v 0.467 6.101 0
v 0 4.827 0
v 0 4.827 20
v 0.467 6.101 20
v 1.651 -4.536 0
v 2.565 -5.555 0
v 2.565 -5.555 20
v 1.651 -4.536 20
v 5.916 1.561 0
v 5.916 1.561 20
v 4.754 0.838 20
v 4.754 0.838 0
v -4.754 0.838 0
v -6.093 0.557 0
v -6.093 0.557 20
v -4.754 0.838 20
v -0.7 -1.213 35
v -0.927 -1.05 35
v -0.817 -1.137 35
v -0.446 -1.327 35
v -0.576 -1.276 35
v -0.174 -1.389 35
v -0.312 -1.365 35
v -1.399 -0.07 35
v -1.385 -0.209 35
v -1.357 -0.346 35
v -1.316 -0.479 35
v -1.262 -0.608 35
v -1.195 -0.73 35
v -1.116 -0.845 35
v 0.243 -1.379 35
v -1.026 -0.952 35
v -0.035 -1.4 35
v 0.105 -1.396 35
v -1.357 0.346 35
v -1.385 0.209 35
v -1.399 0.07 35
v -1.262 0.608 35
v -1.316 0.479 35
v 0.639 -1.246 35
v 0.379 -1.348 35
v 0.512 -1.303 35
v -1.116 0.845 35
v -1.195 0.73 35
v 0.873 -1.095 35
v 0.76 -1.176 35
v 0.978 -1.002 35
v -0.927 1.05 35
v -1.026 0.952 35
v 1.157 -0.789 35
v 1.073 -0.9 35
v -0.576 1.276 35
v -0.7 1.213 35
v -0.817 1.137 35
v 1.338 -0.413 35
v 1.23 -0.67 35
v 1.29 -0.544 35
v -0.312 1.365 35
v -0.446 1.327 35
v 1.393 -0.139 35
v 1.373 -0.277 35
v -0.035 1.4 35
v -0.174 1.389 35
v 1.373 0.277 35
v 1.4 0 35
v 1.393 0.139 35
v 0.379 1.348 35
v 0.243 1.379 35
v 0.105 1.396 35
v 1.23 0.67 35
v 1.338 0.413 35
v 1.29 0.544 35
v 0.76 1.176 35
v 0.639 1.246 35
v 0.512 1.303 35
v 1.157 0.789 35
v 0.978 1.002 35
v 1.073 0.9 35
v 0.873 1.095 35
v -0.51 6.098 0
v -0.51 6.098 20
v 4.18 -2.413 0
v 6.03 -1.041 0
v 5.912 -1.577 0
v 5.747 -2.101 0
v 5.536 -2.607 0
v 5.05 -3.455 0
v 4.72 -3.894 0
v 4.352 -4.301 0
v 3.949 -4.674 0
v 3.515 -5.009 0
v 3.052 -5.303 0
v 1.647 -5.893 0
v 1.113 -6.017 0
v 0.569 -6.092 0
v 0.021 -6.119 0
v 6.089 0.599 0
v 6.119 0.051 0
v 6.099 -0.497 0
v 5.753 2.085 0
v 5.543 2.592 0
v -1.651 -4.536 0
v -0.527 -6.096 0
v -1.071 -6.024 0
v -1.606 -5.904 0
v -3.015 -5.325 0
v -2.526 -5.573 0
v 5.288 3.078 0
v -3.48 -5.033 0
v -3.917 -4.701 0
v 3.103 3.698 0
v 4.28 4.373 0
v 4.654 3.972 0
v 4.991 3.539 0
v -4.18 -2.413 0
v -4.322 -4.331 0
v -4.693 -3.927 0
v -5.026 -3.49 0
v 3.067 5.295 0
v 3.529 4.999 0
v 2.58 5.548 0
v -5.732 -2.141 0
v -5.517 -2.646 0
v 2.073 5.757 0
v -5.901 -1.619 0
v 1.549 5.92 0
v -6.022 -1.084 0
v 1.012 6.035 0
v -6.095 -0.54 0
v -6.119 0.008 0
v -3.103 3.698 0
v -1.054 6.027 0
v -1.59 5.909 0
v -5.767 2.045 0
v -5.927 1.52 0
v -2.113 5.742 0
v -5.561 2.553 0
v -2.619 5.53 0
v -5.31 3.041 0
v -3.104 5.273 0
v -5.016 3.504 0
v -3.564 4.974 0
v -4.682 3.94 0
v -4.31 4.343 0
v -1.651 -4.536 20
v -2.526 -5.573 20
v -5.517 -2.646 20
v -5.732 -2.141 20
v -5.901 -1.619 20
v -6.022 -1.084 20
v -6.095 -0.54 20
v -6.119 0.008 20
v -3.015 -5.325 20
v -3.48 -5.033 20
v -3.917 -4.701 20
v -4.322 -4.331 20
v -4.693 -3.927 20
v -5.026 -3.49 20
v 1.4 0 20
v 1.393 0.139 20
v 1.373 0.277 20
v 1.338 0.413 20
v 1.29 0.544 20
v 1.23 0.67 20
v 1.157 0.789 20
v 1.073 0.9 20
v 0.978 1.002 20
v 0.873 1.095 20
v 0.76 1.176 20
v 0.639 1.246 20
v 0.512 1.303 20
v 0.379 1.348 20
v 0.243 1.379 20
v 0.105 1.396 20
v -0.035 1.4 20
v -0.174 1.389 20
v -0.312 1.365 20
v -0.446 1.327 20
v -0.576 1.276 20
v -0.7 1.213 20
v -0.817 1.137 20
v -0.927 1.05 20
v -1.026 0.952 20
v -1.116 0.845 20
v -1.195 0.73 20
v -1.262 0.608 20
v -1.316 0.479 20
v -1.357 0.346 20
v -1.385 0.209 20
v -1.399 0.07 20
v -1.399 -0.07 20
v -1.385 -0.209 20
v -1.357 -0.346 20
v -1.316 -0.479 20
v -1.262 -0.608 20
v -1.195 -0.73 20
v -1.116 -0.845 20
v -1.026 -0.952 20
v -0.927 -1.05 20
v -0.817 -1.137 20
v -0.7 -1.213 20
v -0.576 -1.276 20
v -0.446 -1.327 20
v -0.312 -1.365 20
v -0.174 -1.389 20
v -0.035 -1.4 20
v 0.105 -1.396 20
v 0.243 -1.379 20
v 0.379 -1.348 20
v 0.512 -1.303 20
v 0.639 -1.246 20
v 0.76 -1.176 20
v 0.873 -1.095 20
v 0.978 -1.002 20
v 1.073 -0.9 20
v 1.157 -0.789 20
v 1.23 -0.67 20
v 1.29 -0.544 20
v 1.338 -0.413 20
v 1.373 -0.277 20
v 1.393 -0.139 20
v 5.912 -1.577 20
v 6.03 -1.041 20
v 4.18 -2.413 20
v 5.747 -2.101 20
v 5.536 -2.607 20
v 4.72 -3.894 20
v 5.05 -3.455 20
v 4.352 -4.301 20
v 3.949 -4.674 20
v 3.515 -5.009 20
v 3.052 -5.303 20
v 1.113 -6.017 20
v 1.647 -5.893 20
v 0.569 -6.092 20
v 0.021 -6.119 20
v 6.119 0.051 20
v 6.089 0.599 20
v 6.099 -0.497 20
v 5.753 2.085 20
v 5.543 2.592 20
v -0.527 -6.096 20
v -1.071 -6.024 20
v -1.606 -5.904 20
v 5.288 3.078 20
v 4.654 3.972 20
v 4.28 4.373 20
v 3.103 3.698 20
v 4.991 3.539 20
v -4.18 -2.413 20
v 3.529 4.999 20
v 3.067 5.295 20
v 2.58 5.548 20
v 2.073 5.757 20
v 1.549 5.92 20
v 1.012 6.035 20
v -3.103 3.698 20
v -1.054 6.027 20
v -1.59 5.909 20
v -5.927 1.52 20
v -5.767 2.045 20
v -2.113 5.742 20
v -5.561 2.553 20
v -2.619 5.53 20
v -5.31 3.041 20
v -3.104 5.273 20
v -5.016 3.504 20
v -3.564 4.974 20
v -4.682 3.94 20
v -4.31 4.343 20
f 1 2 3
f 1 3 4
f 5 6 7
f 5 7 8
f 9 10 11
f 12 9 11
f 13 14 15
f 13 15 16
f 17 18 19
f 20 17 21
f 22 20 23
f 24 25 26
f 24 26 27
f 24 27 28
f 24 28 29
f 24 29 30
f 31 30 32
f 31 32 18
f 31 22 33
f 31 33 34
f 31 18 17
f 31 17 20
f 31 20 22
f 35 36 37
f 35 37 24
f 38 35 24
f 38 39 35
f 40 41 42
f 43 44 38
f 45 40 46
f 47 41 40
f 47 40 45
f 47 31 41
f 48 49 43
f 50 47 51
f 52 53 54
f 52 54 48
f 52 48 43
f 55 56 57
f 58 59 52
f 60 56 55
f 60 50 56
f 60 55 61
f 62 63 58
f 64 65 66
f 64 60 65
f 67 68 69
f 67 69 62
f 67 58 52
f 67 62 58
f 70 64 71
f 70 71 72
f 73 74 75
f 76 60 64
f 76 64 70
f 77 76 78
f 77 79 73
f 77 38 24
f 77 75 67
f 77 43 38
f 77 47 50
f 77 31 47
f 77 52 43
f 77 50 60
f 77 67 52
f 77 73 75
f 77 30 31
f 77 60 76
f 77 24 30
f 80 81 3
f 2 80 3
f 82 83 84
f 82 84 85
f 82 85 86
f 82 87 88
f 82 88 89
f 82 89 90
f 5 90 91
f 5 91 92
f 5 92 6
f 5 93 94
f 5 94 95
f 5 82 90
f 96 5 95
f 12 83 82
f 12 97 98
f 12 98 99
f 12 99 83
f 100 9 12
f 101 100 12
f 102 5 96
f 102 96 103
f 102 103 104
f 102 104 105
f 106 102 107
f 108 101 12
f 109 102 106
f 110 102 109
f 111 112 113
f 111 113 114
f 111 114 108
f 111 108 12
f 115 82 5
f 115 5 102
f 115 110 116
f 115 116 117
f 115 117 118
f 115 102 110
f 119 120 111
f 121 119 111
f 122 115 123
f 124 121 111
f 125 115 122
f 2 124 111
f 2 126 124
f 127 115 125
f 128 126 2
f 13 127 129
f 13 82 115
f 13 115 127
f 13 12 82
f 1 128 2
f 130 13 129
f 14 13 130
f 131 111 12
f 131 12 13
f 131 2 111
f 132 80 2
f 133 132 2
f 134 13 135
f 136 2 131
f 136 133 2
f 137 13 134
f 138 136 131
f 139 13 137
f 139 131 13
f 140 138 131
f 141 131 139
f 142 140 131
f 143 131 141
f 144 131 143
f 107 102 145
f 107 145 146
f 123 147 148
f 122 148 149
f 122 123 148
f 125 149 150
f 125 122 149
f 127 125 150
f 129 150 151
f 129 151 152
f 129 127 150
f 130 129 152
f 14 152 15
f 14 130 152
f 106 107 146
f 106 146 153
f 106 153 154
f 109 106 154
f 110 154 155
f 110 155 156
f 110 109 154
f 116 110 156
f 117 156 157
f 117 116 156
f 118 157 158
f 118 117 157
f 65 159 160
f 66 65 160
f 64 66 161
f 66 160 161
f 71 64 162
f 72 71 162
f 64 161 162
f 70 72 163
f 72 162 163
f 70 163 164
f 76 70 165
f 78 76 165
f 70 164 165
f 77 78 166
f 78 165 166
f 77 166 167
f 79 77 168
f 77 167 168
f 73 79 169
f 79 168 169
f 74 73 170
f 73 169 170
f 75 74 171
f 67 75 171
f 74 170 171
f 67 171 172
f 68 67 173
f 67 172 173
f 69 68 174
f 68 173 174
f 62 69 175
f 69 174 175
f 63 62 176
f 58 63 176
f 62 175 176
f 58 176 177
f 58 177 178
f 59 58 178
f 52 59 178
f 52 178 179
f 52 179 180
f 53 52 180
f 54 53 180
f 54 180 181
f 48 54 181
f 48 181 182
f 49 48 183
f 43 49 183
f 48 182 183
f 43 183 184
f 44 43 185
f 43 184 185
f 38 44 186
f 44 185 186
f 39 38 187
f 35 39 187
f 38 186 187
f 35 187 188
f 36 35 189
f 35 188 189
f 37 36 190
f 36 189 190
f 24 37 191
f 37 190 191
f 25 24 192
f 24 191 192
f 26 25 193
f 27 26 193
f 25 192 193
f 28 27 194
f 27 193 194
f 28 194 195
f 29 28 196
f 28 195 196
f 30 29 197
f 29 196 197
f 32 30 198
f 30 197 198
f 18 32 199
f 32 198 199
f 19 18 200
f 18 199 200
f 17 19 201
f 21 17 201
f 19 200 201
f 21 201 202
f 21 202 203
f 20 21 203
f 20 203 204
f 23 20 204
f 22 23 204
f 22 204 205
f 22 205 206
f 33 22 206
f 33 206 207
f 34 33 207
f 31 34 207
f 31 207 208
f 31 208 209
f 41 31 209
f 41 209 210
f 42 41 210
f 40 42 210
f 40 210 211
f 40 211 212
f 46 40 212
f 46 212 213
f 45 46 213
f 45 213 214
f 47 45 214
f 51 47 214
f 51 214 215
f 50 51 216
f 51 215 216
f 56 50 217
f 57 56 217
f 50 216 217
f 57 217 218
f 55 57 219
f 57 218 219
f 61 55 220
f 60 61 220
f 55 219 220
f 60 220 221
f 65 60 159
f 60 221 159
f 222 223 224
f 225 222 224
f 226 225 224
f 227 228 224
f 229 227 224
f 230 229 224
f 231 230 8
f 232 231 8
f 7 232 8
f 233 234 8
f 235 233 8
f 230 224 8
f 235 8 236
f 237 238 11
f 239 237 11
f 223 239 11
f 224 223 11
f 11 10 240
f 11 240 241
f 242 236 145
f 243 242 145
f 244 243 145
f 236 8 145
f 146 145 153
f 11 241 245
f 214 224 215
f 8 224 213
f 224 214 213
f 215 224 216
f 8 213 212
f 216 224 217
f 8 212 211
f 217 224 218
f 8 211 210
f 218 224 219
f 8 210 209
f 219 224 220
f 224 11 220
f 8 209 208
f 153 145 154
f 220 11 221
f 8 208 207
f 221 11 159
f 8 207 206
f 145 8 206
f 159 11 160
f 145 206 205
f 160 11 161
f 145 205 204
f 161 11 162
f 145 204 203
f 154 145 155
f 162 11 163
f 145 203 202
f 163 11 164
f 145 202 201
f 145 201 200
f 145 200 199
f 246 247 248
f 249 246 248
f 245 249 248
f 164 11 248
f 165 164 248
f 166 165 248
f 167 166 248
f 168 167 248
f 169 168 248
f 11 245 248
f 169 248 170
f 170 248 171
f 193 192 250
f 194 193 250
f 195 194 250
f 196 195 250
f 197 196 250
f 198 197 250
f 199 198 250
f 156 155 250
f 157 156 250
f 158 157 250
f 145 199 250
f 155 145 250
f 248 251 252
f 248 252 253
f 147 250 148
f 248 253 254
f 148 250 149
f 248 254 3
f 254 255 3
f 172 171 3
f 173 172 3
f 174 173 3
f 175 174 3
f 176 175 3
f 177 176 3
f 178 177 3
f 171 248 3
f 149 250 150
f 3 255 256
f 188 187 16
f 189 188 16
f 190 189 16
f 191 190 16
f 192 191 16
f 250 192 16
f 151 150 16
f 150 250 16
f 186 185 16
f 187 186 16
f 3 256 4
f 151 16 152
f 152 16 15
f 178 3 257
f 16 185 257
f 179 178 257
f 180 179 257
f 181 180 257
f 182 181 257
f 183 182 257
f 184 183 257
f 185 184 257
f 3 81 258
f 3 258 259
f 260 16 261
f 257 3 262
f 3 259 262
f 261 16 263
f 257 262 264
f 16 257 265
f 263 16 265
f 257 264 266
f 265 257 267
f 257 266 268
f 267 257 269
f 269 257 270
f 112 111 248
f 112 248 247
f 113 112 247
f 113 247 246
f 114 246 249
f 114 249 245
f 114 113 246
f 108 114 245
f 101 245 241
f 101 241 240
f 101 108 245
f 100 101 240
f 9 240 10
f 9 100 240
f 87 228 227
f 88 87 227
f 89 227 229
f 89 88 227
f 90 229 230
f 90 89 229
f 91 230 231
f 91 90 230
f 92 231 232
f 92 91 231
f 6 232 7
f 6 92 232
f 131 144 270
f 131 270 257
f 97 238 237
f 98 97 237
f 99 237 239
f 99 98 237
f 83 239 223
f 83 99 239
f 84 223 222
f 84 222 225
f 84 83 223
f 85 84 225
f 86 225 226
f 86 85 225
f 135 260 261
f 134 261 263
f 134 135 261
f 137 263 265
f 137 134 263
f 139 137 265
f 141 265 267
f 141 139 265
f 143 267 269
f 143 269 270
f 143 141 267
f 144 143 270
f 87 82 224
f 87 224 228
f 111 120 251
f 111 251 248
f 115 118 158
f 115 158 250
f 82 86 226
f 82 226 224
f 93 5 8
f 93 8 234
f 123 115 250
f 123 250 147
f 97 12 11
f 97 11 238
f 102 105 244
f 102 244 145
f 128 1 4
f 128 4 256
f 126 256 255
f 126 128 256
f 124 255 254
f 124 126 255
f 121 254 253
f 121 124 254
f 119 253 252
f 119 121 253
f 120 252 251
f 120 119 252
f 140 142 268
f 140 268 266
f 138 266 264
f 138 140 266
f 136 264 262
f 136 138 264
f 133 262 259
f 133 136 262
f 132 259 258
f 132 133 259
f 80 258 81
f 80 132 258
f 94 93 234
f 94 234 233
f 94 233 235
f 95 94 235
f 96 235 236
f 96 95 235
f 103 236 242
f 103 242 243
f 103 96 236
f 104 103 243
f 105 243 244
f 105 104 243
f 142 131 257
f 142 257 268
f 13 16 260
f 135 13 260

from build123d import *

# Parameters (mm, degrees)
BOSS_EXTRUDE1_DEPTH = 20
SKETCH2_R           = 1.400281721
BOSS_EXTRUDE3_DEPTH = 15


with BuildPart() as part:
    # Sketch1 → Boss-Extrude1 (new body)
    with BuildSketch(Plane.XY):
        with BuildLine():
            Line((3.102637299, 3.697579148), (4.279619218, 4.373206779))
            ThreePointArc((4.279619218, 4.373206779), (5.288327072, 3.077933555), (5.916340543, 1.561087044))
            Line((5.916340543, 1.561087044), (4.753516124, 0.838173146))
            Line((4.753516124, 0.838173146), (6.089421653, 0.599184544))
            ThreePointArc((6.089421653, 0.599184544), (6.029551119, -1.041437222), (5.535627206, -2.607088341))
            Line((5.535627206, -2.607088341), (4.180171925, -2.413423386))
            Line((4.180171925, -2.413423386), (5.04991602, -3.455202798))
            ThreePointArc((5.04991602, -3.455202798), (3.949481187, -4.673507948), (2.564732378, -5.555378116))
            Line((2.564732378, -5.555378116), (1.650878825, -4.535752294))
            Line((1.650878825, -4.535752294), (1.647498557, -5.892862351))
            ThreePointArc((1.647498557, -5.892862351), (0.021405114, -6.118792365), (-1.606229234, -5.90424473))
            Line((-1.606229234, -5.90424473), (-1.650878825, -4.535752294))
            Line((-1.650878825, -4.535752294), (-2.52580179, -5.573186118))
            ThreePointArc((-2.52580179, -5.573186118), (-3.91668665, -4.701025832), (-5.025618336, -3.490449616))
            Line((-5.025618336, -3.490449616), (-4.180171925, -2.413423386))
            Line((-4.180171925, -2.413423386), (-5.517251408, -2.645754161))
            ThreePointArc((-5.517251408, -2.645754161), (-6.022117201, -1.083597066), (-6.093464765, 0.556565665))
            Line((-6.093464765, 0.556565665), (-4.753516124, 0.838173146))
            Line((-4.753516124, 0.838173146), (-5.927117776, 1.519655572))
            ThreePointArc((-5.927117776, 1.519655572), (-5.309732185, 3.04085881), (-4.310111309, 4.343157686))
            Line((-4.310111309, 4.343157686), (-3.102637299, 3.697579148))
            Line((-3.102637299, 3.697579148), (-3.563619863, 4.974001574))
            ThreePointArc((-3.563619863, 4.974001574), (-2.112864469, 5.742463053), (-0.51000887, 6.097537957))
            Line((-0.51000887, 6.097537957), (0, 4.826846773))
            Line((0, 4.826846773), (0.467335389, 6.100956959))
            ThreePointArc((0.467335389, 6.100956959), (2.072636014, 5.757105014), (3.528732387, 4.998812451))
            Line((3.528732387, 4.998812451), (3.102637299, 3.697579148))
        make_face()
    extrude(amount=BOSS_EXTRUDE1_DEPTH)

    # Sketch2 → Boss-Extrude3 (add)
    with BuildSketch(Plane.XY.offset(20)):
        Circle(SKETCH2_R)
    extrude(amount=BOSS_EXTRUDE3_DEPTH)


solid = part.part
